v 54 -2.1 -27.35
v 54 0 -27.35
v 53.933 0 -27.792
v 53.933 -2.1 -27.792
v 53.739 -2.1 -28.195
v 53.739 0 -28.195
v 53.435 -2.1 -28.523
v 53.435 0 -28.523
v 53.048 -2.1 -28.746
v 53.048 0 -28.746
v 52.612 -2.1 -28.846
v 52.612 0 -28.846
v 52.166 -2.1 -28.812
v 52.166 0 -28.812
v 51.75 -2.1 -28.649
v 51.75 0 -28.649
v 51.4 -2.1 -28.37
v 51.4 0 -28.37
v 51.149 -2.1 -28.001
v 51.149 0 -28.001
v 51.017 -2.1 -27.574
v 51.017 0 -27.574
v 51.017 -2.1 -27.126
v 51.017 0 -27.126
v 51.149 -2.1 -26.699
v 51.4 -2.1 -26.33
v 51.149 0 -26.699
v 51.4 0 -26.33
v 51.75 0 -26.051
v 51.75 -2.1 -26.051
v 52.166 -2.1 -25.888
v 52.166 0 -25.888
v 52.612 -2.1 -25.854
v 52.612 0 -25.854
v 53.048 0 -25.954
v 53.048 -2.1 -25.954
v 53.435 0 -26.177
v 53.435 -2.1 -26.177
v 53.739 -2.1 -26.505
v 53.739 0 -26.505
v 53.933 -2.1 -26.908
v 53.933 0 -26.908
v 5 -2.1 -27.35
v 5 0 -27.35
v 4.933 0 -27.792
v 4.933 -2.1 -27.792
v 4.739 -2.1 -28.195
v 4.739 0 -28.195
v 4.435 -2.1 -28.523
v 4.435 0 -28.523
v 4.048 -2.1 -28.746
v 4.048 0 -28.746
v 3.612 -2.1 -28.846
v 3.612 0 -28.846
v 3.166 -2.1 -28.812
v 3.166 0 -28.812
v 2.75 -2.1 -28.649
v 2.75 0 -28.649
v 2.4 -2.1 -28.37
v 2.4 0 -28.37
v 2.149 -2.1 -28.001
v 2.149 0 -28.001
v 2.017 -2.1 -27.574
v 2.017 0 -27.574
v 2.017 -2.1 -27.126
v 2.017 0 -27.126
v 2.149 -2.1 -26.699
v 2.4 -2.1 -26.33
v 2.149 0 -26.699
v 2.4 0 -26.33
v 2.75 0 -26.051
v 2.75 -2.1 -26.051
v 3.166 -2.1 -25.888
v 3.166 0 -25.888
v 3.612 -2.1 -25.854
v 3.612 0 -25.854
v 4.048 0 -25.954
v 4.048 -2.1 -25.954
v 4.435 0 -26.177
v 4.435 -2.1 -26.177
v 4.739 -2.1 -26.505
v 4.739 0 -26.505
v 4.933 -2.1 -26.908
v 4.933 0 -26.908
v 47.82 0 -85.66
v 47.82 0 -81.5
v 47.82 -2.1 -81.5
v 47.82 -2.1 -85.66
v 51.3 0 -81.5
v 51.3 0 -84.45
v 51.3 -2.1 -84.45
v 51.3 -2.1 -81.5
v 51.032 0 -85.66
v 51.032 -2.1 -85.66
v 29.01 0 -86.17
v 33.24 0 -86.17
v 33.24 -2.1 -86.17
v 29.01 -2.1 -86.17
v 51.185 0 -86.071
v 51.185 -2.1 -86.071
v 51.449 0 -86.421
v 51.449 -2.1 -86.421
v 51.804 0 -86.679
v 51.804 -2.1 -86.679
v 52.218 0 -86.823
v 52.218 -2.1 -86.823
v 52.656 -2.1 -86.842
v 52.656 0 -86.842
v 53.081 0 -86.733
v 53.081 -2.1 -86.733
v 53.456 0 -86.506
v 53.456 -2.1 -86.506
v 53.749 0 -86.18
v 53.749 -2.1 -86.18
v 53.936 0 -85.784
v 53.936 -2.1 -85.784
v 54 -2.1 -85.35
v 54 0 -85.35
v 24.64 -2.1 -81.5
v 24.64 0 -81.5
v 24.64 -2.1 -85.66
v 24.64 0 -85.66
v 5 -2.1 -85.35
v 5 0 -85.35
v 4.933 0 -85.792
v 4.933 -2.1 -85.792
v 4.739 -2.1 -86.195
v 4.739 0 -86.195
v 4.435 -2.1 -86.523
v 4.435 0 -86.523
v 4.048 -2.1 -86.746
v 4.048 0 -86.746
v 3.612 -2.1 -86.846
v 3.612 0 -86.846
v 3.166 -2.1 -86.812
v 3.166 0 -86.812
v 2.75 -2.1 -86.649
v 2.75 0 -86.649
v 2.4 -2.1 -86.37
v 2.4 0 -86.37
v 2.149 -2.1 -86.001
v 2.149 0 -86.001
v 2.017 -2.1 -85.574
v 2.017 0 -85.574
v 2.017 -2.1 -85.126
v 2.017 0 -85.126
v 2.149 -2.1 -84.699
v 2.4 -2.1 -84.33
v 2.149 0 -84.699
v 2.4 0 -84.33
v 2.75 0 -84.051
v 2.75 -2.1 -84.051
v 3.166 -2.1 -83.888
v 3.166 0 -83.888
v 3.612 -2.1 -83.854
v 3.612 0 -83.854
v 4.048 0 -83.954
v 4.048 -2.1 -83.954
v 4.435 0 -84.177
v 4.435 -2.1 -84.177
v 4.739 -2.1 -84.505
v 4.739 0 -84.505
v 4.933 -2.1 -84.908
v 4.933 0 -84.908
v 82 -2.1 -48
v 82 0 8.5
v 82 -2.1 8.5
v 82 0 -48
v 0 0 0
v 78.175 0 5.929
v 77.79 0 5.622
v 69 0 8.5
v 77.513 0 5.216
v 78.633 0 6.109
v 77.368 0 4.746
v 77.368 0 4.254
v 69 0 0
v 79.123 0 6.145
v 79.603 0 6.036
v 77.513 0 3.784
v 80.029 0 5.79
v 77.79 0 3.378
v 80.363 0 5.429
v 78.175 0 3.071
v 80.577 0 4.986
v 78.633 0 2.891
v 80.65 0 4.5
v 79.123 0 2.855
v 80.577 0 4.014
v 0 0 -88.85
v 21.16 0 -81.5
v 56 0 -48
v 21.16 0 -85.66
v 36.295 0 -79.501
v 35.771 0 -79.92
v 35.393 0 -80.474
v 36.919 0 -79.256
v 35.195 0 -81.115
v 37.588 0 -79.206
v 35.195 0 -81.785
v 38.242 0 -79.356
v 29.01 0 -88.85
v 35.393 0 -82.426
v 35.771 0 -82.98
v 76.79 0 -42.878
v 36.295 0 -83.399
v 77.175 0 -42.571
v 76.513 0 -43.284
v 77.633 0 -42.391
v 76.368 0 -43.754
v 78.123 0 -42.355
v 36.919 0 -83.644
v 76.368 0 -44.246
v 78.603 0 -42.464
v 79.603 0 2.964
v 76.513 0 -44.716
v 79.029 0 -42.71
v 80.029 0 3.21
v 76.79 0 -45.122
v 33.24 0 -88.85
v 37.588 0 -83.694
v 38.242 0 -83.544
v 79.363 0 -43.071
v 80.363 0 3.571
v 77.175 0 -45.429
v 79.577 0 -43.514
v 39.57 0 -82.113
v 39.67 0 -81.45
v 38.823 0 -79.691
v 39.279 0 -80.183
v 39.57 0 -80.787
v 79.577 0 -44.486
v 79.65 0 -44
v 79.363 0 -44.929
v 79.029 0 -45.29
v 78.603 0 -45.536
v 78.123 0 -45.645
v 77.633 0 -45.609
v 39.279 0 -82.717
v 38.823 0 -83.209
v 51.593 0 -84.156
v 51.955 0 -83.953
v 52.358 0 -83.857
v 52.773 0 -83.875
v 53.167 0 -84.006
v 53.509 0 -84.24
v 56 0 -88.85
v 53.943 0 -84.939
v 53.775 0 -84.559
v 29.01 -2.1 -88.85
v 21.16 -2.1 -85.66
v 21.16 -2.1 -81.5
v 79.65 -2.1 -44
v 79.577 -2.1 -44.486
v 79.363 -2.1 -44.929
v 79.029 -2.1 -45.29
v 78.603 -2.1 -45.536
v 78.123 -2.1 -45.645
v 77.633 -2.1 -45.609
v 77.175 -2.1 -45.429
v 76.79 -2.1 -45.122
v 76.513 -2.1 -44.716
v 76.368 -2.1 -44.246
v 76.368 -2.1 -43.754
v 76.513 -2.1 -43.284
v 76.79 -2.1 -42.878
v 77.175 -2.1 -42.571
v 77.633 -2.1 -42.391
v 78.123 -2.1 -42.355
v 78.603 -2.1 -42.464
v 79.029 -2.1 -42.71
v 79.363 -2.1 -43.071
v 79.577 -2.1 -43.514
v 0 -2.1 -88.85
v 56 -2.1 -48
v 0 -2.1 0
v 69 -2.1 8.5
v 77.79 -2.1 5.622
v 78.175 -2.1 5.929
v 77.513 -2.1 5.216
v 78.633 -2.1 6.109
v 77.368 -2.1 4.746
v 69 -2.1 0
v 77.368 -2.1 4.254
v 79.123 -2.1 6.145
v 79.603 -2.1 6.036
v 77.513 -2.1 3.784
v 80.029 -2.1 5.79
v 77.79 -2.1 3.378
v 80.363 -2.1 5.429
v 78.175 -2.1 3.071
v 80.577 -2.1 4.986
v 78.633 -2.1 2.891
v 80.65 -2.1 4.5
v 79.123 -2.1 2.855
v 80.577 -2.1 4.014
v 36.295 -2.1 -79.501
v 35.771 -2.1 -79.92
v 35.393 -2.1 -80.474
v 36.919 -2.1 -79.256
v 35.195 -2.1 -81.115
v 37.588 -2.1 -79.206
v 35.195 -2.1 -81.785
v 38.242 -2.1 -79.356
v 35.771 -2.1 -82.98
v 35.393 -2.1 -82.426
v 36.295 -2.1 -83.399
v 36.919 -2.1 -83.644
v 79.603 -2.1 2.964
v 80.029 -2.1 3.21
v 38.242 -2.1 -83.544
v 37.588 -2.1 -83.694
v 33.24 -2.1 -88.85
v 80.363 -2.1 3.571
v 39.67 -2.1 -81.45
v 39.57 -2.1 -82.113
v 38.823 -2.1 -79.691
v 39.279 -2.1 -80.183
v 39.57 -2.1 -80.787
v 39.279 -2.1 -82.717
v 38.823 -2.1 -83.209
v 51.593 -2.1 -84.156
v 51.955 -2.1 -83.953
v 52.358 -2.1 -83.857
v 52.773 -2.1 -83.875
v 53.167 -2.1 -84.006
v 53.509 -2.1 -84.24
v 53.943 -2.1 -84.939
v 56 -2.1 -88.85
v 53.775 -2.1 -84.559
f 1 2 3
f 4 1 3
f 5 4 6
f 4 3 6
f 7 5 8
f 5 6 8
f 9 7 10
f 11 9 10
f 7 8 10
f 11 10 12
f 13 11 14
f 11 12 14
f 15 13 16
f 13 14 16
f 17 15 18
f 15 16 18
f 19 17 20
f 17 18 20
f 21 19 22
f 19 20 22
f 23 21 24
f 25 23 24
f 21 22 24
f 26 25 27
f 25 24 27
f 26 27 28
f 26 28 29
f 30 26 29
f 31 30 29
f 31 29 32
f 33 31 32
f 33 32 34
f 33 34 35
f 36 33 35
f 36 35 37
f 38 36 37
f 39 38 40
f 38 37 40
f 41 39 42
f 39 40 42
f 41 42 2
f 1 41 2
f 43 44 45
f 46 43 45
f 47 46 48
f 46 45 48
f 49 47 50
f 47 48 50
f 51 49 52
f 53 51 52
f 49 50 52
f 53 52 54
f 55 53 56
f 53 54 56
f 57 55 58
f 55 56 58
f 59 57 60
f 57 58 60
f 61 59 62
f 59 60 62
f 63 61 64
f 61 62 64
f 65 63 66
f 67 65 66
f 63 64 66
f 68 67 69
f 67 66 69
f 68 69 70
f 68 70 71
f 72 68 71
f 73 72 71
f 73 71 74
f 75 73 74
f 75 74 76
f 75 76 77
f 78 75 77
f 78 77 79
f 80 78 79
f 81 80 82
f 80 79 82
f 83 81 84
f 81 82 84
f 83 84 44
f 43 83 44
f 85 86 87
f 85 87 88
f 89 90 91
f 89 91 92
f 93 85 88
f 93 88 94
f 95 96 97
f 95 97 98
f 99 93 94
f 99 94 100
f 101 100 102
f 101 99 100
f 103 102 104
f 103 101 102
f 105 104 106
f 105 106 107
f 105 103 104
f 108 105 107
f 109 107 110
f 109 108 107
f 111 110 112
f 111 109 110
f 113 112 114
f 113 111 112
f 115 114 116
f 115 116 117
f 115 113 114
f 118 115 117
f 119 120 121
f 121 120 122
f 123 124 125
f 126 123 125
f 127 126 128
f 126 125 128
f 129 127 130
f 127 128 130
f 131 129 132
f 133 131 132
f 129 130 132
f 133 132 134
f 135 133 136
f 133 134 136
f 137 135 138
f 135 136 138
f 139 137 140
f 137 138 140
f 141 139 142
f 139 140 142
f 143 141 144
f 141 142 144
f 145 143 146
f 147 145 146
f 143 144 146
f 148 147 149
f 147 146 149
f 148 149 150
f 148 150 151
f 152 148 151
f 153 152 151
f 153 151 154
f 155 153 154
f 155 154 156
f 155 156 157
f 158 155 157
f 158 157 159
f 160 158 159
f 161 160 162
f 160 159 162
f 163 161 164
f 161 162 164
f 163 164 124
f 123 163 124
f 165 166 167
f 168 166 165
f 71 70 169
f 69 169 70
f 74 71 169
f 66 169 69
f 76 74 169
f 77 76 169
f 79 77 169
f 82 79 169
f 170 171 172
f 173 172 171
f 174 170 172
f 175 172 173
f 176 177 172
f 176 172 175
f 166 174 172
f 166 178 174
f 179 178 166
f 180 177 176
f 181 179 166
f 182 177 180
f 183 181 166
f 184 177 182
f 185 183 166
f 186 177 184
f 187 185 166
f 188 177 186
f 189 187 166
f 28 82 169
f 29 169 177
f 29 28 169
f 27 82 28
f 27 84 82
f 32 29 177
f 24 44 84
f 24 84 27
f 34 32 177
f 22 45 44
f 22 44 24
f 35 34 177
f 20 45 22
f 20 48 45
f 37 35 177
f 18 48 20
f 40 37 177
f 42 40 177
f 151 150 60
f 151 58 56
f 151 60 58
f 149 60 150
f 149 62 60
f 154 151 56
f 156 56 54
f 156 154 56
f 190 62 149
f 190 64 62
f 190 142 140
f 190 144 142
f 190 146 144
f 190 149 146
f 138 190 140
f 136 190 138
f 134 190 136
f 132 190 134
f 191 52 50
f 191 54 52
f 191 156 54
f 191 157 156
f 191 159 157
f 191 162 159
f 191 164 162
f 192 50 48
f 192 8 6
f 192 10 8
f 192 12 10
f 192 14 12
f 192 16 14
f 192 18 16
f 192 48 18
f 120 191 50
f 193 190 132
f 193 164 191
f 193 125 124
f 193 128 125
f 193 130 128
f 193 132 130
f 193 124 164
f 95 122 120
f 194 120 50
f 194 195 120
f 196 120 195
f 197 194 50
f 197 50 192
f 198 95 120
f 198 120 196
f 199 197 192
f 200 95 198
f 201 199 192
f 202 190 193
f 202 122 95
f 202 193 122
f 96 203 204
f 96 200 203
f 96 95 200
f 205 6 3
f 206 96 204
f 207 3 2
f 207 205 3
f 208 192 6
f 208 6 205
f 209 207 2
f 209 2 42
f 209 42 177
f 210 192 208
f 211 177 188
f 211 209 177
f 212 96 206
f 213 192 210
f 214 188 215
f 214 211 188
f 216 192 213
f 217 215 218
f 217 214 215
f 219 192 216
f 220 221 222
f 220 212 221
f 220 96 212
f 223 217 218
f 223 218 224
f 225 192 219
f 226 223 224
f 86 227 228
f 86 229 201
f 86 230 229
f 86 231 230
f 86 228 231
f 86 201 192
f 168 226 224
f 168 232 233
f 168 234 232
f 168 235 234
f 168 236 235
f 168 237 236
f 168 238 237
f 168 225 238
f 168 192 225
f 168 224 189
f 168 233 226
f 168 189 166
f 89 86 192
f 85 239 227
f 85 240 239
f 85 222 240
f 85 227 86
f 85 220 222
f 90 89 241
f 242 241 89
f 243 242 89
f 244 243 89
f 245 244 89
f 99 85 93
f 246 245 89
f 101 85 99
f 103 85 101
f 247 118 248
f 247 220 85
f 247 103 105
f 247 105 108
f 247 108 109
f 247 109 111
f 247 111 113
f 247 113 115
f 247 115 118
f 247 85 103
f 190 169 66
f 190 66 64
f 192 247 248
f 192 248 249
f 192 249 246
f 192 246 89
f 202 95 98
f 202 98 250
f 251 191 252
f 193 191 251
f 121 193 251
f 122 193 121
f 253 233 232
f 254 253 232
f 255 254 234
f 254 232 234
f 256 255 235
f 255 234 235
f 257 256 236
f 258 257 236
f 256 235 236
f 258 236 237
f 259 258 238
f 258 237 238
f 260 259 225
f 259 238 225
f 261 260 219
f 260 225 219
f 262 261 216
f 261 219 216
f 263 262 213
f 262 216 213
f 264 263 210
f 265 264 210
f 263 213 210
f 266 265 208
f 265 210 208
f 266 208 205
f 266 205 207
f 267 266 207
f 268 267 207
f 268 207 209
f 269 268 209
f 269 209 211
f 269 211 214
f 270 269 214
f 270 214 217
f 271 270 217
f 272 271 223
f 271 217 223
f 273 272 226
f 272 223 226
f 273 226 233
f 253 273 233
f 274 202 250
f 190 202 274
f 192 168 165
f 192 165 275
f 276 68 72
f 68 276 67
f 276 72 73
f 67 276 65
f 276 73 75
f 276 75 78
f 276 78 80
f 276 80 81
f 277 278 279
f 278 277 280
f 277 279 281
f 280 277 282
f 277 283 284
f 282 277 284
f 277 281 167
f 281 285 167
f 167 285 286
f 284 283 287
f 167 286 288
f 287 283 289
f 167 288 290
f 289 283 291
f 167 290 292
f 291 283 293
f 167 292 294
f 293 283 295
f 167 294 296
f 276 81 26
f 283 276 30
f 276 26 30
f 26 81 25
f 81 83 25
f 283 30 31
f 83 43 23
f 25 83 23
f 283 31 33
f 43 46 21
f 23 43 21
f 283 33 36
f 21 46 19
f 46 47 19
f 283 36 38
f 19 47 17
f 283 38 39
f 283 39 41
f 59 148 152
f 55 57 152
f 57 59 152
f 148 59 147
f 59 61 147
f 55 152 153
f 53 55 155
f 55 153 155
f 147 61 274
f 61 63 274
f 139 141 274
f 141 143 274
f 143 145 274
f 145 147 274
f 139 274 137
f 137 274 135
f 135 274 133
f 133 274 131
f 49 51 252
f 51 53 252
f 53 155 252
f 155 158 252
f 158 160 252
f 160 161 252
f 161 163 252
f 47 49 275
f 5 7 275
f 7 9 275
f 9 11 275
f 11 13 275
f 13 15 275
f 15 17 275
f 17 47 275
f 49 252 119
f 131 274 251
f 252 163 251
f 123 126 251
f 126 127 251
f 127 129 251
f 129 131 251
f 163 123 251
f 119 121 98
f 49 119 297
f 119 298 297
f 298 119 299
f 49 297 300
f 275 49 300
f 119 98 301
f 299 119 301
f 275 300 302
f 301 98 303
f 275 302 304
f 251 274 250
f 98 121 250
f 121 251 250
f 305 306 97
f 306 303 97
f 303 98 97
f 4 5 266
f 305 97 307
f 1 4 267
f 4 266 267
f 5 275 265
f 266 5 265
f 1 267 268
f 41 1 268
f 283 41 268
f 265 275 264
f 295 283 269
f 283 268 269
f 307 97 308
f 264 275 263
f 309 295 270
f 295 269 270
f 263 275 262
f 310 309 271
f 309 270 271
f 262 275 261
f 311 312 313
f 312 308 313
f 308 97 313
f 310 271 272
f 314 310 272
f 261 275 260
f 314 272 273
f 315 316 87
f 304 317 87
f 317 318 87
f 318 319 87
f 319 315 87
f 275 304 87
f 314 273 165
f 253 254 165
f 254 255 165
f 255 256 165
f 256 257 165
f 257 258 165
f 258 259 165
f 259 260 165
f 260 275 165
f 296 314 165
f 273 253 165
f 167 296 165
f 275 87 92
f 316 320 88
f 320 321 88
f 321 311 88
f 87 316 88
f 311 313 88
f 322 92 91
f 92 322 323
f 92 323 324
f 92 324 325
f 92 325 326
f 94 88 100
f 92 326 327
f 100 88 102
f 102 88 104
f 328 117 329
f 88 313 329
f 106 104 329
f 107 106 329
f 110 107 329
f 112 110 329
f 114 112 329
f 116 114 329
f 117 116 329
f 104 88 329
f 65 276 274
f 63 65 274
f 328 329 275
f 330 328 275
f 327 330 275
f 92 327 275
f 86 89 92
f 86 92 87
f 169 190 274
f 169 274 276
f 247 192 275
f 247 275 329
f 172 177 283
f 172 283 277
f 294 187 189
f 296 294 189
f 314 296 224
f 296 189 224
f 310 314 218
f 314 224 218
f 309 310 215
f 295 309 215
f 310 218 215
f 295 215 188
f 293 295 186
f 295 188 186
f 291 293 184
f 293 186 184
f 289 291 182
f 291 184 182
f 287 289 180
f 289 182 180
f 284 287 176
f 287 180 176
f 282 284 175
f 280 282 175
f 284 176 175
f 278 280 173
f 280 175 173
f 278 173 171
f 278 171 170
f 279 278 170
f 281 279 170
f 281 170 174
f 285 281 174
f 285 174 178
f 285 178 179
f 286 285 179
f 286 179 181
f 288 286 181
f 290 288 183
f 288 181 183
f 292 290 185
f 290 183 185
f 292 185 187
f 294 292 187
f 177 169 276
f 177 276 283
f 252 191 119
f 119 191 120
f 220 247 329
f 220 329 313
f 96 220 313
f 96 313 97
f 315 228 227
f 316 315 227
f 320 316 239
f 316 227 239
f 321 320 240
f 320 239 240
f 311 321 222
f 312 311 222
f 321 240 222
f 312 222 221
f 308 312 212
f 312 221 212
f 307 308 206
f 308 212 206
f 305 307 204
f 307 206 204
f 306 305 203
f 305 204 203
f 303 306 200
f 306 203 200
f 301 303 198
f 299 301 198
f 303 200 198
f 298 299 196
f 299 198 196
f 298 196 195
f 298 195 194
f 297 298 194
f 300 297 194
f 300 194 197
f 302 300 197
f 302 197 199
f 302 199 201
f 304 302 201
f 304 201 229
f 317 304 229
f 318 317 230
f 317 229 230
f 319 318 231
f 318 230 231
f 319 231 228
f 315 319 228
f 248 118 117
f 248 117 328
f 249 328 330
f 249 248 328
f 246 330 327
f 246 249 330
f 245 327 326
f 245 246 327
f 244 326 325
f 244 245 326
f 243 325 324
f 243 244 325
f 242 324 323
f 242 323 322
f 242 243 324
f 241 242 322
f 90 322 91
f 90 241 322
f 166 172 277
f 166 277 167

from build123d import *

# Parameters (mm, degrees)
SKETCH1_R           = 1.5
SKETCH1_R_2         = 1.65
SKETCH1_W           = 3.48
SKETCH1_H           = 4.16
SKETCH1_R_3         = 2.25
BOSS_EXTRUDE2_DEPTH = 2.1


with BuildPart() as part:
    # Sketch1 → Boss-Extrude2 (new body)
    with BuildSketch(Plane(origin=(0, 0, 0), x_dir=(1, 0, 0), z_dir=(0, 1, 0))):
        Polygon((0, 88.85), (0, 0), (69, 0), (69, -8.5), (82, -8.5), (82, 48), (56, 48), (56, 88.85), (33.24, 88.85), (33.24, 86.17), (29.01, 86.17), (29.01, 88.85), align=None)
        with Locations((3.5, 27.35)):
            Circle(SKETCH1_R, mode=Mode.SUBTRACT)
        with Locations((79, -4.5)):
            Circle(SKETCH1_R_2, mode=Mode.SUBTRACT)
        with Locations((52.5, 27.35)):
            Circle(SKETCH1_R, mode=Mode.SUBTRACT)
        with Locations((3.5, 85.35)):
            Circle(SKETCH1_R, mode=Mode.SUBTRACT)
        with Locations((22.9, 83.58)):
            Rectangle(SKETCH1_W, SKETCH1_H, mode=Mode.SUBTRACT)
        with Locations((37.42, 81.45)):
            Circle(SKETCH1_R_3, mode=Mode.SUBTRACT)
        with Locations((78, 44)):
            Circle(SKETCH1_R_2, mode=Mode.SUBTRACT)
        with BuildLine():
            Line((51.3, 84.45), (51.3, 81.5))
            Line((51.3, 81.5), (47.82, 81.5))
            Line((47.82, 81.5), (47.82, 85.66))
            Line((47.82, 85.66), (51.032382884, 85.66))
            ThreePointArc((51.032382884, 85.66), (52.655843392, 86.841882313), (54, 85.35))
            ThreePointArc((54, 85.35), (52.974341649, 83.926975053), (51.3, 84.45))
        make_face(mode=Mode.SUBTRACT)
    extrude(amount=-BOSS_EXTRUDE2_DEPTH)


solid = part.part
